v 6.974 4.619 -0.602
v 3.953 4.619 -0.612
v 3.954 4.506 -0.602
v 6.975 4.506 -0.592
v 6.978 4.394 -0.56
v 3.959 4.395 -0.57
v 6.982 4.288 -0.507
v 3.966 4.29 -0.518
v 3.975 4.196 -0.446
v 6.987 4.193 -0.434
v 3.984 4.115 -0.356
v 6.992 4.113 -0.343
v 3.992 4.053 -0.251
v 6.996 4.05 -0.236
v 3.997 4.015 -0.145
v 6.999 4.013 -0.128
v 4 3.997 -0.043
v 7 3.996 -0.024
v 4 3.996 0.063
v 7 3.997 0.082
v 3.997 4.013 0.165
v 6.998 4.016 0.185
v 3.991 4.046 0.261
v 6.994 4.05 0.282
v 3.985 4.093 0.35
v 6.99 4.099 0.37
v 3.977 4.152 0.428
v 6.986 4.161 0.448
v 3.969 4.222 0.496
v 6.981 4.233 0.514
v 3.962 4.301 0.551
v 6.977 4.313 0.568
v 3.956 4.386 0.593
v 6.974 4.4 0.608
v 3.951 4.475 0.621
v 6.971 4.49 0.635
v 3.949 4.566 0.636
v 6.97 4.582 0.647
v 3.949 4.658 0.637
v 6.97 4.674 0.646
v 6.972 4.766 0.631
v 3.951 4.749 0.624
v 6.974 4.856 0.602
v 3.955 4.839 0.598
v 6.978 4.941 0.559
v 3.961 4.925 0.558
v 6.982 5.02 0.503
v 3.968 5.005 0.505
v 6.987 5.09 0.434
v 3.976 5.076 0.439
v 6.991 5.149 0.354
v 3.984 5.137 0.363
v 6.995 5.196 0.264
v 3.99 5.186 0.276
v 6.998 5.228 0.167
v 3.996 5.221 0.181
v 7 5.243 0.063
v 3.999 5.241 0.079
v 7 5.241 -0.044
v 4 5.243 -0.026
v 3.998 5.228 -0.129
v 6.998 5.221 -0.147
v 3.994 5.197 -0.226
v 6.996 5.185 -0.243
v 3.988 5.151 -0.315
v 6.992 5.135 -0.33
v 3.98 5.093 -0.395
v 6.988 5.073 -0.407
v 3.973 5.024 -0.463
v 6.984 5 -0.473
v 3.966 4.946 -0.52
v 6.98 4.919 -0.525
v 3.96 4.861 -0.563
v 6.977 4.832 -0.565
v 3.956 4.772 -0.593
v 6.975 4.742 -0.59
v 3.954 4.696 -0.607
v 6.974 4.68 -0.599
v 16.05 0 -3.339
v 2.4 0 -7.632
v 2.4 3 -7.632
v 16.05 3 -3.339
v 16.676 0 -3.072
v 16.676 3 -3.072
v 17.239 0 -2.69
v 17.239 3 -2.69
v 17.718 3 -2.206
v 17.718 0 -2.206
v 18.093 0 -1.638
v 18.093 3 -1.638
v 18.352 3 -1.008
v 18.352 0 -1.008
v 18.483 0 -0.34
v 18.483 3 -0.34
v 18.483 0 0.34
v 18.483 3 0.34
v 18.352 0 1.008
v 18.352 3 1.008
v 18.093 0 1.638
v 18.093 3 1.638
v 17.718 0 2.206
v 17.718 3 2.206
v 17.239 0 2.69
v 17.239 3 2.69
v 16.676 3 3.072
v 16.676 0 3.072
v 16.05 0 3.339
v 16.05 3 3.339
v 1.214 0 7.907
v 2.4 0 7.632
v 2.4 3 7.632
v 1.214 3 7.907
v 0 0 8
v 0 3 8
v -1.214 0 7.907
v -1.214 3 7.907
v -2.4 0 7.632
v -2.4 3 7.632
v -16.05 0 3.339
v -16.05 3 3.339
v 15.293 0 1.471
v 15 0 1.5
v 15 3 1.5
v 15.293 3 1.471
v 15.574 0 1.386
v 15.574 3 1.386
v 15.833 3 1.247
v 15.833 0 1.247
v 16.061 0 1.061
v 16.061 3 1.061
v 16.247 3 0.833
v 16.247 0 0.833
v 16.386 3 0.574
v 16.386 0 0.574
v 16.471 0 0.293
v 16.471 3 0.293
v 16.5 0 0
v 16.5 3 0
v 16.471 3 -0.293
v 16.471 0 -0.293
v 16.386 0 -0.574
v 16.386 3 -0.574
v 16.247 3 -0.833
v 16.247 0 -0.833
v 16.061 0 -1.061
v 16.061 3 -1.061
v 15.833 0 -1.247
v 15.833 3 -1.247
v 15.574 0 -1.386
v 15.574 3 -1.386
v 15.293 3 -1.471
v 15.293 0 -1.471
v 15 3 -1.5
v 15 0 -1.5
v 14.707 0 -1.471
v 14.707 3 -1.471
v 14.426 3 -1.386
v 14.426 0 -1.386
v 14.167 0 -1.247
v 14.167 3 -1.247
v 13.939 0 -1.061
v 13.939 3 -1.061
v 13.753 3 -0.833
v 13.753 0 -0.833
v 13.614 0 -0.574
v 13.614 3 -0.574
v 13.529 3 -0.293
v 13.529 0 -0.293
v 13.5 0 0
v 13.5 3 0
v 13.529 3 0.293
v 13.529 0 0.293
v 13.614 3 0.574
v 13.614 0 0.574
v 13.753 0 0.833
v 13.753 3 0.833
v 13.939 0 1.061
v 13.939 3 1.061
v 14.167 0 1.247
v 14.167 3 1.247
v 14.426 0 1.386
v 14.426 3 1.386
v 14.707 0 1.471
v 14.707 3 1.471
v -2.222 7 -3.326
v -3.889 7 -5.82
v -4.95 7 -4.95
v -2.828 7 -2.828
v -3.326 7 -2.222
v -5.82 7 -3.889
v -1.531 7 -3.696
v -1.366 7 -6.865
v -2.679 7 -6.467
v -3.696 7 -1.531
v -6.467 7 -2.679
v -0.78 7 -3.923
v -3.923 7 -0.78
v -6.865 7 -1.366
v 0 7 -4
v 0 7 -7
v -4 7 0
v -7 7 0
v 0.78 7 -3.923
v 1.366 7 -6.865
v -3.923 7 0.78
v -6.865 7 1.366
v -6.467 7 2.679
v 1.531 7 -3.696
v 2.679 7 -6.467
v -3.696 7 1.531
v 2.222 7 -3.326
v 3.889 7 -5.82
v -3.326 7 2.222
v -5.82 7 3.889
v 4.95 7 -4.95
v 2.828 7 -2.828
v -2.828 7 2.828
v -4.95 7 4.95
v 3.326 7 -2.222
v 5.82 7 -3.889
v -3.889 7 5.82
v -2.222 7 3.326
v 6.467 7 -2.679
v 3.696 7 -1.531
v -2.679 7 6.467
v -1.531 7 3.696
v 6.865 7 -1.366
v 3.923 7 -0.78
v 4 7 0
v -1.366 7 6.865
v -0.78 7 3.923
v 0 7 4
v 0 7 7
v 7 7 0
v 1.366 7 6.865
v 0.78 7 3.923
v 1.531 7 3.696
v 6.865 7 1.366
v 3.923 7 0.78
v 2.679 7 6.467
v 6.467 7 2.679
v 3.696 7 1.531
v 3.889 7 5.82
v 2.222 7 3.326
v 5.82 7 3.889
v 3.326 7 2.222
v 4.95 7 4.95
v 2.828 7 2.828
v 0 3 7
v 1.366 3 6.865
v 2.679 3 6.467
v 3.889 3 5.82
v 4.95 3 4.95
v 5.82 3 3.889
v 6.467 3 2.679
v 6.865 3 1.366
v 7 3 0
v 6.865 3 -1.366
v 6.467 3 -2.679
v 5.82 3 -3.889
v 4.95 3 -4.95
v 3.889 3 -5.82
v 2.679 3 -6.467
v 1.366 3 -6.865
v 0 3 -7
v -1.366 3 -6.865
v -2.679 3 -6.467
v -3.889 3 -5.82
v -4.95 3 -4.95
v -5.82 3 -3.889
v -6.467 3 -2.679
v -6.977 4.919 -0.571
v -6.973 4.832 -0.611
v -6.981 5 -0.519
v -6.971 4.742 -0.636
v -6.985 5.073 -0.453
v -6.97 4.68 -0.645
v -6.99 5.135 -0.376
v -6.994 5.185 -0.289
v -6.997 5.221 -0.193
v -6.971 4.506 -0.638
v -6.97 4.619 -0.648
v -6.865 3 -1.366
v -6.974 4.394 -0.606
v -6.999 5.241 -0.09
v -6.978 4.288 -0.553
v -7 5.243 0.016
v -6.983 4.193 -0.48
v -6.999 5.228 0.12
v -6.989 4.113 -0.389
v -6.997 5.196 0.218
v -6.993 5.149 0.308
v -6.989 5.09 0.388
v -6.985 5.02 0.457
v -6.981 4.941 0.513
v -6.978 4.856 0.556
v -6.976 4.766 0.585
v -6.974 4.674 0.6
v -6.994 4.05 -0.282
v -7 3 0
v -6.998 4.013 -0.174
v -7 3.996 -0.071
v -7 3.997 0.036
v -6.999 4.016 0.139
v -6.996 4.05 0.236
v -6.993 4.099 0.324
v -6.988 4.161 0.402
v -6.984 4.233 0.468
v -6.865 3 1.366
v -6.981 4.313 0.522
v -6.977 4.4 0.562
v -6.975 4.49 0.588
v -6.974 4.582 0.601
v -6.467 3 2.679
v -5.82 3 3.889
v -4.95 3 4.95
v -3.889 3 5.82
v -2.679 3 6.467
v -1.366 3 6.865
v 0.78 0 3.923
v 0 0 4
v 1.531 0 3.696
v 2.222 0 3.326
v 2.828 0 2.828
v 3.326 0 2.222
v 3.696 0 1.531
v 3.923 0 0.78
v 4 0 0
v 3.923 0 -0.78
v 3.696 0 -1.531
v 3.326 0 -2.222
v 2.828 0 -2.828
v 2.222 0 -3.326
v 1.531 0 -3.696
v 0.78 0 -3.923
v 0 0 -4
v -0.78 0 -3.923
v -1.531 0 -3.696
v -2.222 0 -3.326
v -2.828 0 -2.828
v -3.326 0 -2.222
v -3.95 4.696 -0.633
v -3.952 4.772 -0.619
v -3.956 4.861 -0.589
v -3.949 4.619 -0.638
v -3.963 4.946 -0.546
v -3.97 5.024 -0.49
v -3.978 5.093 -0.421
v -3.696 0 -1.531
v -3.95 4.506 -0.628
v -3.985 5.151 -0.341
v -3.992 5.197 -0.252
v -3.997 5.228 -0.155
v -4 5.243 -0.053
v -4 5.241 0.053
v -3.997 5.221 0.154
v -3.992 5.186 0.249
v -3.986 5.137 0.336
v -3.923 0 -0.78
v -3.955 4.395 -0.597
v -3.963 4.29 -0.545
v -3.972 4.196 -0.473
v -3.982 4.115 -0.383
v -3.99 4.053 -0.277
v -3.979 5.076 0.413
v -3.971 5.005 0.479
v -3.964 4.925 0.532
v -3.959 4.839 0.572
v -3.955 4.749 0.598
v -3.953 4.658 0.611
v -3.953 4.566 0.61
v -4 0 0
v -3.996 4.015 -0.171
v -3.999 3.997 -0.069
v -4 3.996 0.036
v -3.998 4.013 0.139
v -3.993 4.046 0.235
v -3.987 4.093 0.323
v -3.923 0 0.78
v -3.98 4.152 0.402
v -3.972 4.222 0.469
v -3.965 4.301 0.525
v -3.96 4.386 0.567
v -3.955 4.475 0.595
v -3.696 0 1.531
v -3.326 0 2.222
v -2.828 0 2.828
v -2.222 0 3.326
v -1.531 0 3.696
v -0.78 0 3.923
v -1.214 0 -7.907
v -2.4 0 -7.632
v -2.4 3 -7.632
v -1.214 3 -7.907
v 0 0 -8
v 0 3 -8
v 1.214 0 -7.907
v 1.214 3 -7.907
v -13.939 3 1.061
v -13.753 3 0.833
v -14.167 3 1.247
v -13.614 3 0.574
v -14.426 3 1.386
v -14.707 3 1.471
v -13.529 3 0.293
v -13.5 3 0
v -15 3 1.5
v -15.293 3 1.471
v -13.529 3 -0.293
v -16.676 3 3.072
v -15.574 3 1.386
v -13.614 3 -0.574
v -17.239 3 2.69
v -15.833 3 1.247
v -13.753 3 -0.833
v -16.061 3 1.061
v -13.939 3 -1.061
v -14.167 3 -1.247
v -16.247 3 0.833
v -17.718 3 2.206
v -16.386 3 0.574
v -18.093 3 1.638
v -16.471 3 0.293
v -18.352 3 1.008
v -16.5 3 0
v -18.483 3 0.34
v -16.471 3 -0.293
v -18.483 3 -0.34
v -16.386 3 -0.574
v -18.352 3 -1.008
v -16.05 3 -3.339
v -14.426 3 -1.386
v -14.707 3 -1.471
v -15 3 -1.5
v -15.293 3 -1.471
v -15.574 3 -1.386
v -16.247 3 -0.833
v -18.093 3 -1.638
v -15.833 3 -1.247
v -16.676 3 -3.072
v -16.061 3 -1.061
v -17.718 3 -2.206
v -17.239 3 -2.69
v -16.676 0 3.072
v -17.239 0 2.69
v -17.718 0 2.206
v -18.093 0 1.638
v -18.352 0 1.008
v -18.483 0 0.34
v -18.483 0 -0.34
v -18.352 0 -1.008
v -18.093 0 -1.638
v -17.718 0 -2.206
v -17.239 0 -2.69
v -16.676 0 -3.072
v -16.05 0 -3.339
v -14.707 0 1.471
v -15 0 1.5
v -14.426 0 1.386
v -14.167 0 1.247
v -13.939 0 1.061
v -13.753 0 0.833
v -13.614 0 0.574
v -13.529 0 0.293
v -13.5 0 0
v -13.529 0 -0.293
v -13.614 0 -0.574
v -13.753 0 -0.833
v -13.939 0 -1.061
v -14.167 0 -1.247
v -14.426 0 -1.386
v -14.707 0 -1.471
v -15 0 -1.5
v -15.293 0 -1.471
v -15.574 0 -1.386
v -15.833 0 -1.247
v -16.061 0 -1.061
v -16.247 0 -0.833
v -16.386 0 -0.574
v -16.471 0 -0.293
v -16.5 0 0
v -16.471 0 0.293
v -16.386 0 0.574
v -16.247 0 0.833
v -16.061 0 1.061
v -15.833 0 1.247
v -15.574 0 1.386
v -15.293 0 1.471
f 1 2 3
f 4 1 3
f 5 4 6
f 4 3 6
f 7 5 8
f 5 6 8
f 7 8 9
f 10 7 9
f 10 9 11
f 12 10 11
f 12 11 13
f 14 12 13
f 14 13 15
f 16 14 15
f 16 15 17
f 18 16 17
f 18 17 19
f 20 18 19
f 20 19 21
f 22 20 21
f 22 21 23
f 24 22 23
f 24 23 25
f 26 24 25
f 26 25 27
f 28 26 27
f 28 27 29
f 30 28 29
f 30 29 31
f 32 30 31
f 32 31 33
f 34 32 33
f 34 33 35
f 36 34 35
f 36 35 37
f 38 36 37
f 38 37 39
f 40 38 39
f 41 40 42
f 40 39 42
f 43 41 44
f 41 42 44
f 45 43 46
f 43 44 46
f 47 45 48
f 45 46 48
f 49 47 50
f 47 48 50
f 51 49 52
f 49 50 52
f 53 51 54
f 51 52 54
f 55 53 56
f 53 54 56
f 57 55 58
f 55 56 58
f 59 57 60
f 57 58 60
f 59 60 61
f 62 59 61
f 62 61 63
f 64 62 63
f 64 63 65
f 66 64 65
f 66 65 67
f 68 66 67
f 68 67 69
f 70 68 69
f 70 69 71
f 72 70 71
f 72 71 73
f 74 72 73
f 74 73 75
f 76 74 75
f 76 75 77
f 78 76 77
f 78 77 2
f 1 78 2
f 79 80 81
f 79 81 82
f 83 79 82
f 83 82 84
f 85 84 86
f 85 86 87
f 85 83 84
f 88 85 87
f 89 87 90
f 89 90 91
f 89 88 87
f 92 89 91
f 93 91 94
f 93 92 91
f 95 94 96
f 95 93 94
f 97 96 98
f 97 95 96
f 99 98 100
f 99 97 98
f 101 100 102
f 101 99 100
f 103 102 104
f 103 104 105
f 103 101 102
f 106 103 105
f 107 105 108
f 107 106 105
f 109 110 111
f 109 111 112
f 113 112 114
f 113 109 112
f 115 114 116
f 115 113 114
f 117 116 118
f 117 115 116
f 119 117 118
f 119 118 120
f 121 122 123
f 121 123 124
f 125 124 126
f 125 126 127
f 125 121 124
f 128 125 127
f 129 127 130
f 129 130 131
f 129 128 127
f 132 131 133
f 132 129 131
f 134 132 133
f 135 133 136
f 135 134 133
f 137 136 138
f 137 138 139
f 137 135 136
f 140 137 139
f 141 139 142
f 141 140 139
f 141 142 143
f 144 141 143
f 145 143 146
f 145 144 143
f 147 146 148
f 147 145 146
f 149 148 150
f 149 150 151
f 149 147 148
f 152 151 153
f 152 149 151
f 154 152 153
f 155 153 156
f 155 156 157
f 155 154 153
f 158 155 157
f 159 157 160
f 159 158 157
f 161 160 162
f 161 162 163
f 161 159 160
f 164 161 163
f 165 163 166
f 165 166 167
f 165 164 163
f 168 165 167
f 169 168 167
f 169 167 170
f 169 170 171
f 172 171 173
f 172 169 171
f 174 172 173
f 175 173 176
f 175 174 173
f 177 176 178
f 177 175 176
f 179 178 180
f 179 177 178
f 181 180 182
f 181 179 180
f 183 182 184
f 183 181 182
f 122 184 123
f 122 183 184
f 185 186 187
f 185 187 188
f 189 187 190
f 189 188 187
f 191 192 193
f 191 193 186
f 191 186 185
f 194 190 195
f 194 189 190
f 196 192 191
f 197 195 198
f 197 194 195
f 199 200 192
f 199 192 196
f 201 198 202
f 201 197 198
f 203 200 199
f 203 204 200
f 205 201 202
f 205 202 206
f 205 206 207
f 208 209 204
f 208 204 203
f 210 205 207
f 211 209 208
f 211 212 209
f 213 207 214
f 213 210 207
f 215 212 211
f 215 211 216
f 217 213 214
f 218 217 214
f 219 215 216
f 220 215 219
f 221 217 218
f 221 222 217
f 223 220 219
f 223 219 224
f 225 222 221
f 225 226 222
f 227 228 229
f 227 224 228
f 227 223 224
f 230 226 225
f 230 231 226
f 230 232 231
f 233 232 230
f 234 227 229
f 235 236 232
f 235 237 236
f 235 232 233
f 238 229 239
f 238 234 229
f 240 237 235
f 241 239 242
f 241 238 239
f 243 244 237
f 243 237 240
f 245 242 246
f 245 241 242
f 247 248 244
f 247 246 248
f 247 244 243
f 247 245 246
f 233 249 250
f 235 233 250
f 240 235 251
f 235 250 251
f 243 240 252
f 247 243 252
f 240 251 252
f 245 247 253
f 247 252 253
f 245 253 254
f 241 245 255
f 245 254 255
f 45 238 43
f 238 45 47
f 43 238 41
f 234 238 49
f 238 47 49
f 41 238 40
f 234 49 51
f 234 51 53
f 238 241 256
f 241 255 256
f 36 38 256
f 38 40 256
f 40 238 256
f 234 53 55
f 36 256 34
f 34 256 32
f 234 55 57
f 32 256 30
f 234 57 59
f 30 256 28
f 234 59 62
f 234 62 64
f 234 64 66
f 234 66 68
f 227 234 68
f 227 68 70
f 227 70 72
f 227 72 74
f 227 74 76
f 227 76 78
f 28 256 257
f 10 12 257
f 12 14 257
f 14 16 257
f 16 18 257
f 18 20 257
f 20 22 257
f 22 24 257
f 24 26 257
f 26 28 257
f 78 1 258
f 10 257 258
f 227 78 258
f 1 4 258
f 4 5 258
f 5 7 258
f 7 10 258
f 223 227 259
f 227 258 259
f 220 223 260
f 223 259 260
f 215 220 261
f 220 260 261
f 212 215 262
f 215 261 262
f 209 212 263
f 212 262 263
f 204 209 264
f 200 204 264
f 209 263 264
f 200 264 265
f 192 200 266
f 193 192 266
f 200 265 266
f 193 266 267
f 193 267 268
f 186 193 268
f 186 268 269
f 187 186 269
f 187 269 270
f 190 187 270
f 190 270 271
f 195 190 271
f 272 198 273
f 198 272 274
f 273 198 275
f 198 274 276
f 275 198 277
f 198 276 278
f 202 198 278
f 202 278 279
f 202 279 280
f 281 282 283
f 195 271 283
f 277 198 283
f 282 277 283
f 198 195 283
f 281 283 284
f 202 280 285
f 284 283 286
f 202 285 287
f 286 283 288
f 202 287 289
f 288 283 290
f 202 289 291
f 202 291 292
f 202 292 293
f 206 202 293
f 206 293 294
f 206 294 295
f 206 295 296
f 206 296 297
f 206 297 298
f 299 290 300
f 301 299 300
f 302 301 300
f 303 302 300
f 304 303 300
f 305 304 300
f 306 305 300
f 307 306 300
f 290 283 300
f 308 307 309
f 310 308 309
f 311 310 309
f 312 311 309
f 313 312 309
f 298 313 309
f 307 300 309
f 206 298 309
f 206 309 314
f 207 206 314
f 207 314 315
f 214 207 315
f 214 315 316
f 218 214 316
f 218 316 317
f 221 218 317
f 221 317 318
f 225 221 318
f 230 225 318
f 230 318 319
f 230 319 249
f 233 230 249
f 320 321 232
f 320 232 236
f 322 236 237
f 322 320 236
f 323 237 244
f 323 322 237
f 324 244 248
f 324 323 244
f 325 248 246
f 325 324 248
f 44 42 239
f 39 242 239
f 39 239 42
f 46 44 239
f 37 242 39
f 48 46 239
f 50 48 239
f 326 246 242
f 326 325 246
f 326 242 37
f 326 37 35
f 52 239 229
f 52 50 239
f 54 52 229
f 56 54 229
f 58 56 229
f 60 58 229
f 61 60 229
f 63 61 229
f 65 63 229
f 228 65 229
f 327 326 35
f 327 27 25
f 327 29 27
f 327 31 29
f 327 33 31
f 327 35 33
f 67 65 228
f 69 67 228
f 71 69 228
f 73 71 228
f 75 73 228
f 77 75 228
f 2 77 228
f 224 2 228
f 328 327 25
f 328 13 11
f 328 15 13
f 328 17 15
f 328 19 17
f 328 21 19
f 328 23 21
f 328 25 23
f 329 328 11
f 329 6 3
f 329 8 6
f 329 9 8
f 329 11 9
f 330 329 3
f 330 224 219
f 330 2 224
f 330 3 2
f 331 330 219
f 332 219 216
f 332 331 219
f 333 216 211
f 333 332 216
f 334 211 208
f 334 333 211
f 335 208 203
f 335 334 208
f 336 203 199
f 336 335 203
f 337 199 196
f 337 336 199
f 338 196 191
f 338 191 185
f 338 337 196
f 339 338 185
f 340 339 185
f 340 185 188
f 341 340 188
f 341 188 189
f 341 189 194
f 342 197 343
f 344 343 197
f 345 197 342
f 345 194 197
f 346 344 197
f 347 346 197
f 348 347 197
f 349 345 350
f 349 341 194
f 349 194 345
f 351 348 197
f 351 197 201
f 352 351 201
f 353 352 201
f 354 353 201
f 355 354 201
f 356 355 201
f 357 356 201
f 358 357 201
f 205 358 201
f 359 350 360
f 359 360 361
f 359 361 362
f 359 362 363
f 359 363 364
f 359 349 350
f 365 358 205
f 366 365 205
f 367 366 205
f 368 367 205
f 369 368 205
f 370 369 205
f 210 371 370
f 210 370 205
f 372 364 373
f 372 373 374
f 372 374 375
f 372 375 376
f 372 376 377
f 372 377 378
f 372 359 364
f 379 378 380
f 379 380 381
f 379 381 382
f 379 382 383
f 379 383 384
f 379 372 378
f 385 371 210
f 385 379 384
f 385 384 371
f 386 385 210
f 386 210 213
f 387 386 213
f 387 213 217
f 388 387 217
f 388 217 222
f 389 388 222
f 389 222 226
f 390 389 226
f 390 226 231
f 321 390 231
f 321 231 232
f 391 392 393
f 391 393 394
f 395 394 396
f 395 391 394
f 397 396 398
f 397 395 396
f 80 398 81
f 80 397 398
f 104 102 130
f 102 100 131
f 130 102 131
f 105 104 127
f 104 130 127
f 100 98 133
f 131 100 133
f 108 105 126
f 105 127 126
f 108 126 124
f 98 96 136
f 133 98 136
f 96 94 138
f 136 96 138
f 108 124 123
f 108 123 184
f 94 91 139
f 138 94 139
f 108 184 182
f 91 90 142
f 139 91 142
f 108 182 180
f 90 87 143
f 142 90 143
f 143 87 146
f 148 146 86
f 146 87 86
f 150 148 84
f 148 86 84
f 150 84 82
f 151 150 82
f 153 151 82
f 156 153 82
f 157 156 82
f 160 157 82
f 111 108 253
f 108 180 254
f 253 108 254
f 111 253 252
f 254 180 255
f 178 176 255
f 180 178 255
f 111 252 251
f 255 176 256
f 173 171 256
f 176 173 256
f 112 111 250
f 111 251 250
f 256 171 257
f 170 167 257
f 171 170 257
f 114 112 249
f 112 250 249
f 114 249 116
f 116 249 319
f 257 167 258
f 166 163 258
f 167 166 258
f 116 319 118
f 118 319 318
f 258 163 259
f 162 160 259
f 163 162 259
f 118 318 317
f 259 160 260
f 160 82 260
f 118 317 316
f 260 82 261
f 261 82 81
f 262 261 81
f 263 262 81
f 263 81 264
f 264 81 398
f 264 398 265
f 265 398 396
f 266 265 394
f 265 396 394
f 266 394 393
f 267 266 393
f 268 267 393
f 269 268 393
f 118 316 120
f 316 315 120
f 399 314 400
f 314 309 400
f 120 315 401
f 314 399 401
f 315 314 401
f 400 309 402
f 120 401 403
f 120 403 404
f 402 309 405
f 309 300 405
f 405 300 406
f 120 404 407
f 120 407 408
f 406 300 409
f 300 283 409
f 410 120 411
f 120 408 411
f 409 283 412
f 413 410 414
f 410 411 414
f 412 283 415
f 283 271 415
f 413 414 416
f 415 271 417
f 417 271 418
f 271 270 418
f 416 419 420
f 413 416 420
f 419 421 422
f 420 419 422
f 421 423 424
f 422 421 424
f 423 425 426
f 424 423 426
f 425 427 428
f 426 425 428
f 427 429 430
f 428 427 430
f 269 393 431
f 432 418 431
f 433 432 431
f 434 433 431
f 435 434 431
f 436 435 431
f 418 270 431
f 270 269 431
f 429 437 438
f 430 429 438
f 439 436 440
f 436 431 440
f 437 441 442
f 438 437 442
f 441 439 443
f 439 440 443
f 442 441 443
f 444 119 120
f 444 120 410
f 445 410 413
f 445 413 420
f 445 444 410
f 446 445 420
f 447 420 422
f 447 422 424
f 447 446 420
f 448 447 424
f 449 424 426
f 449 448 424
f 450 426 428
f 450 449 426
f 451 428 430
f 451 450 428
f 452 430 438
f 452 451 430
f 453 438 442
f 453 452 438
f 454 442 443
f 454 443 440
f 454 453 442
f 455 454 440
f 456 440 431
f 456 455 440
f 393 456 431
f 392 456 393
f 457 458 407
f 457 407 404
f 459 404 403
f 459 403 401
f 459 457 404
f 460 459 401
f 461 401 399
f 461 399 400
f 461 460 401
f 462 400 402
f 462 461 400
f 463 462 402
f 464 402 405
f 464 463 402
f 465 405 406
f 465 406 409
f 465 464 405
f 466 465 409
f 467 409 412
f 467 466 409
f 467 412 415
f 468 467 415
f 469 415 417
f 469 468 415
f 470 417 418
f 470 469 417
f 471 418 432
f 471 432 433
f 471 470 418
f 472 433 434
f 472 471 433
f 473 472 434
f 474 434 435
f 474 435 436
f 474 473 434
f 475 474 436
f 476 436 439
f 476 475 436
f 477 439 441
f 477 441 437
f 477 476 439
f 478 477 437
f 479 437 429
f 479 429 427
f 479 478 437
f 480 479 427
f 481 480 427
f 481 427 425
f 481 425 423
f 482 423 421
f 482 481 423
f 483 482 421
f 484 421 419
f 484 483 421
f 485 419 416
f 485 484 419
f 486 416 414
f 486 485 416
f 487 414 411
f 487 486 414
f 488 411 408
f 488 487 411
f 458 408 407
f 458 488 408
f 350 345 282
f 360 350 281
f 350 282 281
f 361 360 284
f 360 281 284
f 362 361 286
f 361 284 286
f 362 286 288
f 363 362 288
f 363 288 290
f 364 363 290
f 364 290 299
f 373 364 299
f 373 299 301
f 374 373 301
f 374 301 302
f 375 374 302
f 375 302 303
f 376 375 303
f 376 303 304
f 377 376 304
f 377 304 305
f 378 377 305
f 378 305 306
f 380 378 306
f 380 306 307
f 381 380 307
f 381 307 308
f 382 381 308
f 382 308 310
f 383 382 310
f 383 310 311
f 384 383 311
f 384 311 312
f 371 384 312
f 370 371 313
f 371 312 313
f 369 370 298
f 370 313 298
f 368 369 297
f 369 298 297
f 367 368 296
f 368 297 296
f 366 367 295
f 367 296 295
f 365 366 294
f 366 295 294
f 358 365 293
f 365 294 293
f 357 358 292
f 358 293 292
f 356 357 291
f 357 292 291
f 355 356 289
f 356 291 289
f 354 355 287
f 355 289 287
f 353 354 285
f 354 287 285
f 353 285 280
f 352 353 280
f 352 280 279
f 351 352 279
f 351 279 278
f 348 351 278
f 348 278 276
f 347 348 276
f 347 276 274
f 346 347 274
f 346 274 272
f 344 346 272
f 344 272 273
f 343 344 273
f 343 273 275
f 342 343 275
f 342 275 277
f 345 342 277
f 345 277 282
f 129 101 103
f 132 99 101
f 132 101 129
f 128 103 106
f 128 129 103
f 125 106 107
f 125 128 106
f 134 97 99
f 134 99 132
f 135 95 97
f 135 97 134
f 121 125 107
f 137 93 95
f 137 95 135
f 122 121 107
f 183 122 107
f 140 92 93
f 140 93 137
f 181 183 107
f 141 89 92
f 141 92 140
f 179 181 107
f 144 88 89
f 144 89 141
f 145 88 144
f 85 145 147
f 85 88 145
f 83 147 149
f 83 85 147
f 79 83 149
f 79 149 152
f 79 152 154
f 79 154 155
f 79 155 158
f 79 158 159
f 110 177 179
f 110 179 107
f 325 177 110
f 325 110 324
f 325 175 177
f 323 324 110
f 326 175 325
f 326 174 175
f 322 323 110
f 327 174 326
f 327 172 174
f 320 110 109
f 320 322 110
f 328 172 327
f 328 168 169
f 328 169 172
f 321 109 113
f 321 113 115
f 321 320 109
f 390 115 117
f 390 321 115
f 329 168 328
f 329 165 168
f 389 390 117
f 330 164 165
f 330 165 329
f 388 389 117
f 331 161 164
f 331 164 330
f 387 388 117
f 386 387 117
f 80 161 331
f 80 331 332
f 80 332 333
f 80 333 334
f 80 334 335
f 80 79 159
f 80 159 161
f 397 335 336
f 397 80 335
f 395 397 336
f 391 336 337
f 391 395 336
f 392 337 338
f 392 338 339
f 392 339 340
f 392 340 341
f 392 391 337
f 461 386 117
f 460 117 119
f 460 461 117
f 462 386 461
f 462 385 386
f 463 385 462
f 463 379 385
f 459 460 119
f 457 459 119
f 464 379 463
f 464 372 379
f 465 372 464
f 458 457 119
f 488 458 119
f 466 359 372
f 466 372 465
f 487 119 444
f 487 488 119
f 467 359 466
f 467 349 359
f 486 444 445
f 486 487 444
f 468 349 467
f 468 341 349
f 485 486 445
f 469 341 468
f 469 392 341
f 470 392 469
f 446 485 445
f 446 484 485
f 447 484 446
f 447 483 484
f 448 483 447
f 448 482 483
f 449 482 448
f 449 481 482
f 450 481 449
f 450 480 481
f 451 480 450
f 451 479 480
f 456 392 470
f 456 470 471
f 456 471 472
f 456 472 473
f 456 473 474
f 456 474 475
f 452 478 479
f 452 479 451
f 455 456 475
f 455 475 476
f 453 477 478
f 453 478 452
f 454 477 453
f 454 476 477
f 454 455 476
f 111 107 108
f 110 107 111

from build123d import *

# Parameters (mm, degrees)
SKETCH_1_R           = 1.5
SKETCH_1_R_2         = 7
EXTRUDE_1_DEPTH      = 3
SKETCH_1_3_R         = 7
SKETCH_1_3_R_2       = 4
EXTRUDE_2_DEPTH      = 7
HOLE_WIZARD_M1_6_1_D = 1.25


with BuildPart() as part:
    # 草图1 → 凸台-拉伸1 (new body)
    with BuildSketch(Plane(origin=(0, 0, 0), x_dir=(1, 0, 0), z_dir=(0, 1, 0))):
        with BuildLine():
            Line((-2.4, 7.631513611), (-16.05, 3.338787205))
            ThreePointArc((-16.05, 3.338787205), (-18.5, 0), (-16.05, -3.338787205))
            Line((-16.05, -3.338787205), (-2.4, -7.631513611))
            ThreePointArc((-2.4, -7.631513611), (0, -8), (2.4, -7.631513611))
            Line((2.4, -7.631513611), (16.05, -3.338787205))
            ThreePointArc((16.05, -3.338787205), (18.5, 0), (16.05, 3.338787205))
            Line((16.05, 3.338787205), (2.4, 7.631513611))
            ThreePointArc((2.4, 7.631513611), (0, 8), (-2.4, 7.631513611))
        make_face()
        with Locations((-15, 0)):
            Circle(SKETCH_1_R, mode=Mode.SUBTRACT)
        Circle(SKETCH_1_R_2, mode=Mode.SUBTRACT)
        with Locations((15, 0)):
            Circle(SKETCH_1_R, mode=Mode.SUBTRACT)
    extrude(amount=EXTRUDE_1_DEPTH)

    # 草图1<3> → 凸台-拉伸2 (add)
    with BuildSketch(Plane(origin=(0, 0, 0), x_dir=(1, 0, 0), z_dir=(0, 1, 0))):
        Circle(SKETCH_1_3_R)
        Circle(SKETCH_1_3_R_2, mode=Mode.SUBTRACT)
    extrude(amount=EXTRUDE_2_DEPTH)

    # M1.6 螺纹孔1 (through all)
    with Locations(Plane(origin=(6.99996172, 4.619290958, 0.023149905), x_dir=(-0.003307129319, 0, 0.999994531433), z_dir=(0.999994531433, 0, 0.003307129319))):
        with Locations((0, 0)):
            Hole(HOLE_WIZARD_M1_6_1_D / 2)


solid = part.part
